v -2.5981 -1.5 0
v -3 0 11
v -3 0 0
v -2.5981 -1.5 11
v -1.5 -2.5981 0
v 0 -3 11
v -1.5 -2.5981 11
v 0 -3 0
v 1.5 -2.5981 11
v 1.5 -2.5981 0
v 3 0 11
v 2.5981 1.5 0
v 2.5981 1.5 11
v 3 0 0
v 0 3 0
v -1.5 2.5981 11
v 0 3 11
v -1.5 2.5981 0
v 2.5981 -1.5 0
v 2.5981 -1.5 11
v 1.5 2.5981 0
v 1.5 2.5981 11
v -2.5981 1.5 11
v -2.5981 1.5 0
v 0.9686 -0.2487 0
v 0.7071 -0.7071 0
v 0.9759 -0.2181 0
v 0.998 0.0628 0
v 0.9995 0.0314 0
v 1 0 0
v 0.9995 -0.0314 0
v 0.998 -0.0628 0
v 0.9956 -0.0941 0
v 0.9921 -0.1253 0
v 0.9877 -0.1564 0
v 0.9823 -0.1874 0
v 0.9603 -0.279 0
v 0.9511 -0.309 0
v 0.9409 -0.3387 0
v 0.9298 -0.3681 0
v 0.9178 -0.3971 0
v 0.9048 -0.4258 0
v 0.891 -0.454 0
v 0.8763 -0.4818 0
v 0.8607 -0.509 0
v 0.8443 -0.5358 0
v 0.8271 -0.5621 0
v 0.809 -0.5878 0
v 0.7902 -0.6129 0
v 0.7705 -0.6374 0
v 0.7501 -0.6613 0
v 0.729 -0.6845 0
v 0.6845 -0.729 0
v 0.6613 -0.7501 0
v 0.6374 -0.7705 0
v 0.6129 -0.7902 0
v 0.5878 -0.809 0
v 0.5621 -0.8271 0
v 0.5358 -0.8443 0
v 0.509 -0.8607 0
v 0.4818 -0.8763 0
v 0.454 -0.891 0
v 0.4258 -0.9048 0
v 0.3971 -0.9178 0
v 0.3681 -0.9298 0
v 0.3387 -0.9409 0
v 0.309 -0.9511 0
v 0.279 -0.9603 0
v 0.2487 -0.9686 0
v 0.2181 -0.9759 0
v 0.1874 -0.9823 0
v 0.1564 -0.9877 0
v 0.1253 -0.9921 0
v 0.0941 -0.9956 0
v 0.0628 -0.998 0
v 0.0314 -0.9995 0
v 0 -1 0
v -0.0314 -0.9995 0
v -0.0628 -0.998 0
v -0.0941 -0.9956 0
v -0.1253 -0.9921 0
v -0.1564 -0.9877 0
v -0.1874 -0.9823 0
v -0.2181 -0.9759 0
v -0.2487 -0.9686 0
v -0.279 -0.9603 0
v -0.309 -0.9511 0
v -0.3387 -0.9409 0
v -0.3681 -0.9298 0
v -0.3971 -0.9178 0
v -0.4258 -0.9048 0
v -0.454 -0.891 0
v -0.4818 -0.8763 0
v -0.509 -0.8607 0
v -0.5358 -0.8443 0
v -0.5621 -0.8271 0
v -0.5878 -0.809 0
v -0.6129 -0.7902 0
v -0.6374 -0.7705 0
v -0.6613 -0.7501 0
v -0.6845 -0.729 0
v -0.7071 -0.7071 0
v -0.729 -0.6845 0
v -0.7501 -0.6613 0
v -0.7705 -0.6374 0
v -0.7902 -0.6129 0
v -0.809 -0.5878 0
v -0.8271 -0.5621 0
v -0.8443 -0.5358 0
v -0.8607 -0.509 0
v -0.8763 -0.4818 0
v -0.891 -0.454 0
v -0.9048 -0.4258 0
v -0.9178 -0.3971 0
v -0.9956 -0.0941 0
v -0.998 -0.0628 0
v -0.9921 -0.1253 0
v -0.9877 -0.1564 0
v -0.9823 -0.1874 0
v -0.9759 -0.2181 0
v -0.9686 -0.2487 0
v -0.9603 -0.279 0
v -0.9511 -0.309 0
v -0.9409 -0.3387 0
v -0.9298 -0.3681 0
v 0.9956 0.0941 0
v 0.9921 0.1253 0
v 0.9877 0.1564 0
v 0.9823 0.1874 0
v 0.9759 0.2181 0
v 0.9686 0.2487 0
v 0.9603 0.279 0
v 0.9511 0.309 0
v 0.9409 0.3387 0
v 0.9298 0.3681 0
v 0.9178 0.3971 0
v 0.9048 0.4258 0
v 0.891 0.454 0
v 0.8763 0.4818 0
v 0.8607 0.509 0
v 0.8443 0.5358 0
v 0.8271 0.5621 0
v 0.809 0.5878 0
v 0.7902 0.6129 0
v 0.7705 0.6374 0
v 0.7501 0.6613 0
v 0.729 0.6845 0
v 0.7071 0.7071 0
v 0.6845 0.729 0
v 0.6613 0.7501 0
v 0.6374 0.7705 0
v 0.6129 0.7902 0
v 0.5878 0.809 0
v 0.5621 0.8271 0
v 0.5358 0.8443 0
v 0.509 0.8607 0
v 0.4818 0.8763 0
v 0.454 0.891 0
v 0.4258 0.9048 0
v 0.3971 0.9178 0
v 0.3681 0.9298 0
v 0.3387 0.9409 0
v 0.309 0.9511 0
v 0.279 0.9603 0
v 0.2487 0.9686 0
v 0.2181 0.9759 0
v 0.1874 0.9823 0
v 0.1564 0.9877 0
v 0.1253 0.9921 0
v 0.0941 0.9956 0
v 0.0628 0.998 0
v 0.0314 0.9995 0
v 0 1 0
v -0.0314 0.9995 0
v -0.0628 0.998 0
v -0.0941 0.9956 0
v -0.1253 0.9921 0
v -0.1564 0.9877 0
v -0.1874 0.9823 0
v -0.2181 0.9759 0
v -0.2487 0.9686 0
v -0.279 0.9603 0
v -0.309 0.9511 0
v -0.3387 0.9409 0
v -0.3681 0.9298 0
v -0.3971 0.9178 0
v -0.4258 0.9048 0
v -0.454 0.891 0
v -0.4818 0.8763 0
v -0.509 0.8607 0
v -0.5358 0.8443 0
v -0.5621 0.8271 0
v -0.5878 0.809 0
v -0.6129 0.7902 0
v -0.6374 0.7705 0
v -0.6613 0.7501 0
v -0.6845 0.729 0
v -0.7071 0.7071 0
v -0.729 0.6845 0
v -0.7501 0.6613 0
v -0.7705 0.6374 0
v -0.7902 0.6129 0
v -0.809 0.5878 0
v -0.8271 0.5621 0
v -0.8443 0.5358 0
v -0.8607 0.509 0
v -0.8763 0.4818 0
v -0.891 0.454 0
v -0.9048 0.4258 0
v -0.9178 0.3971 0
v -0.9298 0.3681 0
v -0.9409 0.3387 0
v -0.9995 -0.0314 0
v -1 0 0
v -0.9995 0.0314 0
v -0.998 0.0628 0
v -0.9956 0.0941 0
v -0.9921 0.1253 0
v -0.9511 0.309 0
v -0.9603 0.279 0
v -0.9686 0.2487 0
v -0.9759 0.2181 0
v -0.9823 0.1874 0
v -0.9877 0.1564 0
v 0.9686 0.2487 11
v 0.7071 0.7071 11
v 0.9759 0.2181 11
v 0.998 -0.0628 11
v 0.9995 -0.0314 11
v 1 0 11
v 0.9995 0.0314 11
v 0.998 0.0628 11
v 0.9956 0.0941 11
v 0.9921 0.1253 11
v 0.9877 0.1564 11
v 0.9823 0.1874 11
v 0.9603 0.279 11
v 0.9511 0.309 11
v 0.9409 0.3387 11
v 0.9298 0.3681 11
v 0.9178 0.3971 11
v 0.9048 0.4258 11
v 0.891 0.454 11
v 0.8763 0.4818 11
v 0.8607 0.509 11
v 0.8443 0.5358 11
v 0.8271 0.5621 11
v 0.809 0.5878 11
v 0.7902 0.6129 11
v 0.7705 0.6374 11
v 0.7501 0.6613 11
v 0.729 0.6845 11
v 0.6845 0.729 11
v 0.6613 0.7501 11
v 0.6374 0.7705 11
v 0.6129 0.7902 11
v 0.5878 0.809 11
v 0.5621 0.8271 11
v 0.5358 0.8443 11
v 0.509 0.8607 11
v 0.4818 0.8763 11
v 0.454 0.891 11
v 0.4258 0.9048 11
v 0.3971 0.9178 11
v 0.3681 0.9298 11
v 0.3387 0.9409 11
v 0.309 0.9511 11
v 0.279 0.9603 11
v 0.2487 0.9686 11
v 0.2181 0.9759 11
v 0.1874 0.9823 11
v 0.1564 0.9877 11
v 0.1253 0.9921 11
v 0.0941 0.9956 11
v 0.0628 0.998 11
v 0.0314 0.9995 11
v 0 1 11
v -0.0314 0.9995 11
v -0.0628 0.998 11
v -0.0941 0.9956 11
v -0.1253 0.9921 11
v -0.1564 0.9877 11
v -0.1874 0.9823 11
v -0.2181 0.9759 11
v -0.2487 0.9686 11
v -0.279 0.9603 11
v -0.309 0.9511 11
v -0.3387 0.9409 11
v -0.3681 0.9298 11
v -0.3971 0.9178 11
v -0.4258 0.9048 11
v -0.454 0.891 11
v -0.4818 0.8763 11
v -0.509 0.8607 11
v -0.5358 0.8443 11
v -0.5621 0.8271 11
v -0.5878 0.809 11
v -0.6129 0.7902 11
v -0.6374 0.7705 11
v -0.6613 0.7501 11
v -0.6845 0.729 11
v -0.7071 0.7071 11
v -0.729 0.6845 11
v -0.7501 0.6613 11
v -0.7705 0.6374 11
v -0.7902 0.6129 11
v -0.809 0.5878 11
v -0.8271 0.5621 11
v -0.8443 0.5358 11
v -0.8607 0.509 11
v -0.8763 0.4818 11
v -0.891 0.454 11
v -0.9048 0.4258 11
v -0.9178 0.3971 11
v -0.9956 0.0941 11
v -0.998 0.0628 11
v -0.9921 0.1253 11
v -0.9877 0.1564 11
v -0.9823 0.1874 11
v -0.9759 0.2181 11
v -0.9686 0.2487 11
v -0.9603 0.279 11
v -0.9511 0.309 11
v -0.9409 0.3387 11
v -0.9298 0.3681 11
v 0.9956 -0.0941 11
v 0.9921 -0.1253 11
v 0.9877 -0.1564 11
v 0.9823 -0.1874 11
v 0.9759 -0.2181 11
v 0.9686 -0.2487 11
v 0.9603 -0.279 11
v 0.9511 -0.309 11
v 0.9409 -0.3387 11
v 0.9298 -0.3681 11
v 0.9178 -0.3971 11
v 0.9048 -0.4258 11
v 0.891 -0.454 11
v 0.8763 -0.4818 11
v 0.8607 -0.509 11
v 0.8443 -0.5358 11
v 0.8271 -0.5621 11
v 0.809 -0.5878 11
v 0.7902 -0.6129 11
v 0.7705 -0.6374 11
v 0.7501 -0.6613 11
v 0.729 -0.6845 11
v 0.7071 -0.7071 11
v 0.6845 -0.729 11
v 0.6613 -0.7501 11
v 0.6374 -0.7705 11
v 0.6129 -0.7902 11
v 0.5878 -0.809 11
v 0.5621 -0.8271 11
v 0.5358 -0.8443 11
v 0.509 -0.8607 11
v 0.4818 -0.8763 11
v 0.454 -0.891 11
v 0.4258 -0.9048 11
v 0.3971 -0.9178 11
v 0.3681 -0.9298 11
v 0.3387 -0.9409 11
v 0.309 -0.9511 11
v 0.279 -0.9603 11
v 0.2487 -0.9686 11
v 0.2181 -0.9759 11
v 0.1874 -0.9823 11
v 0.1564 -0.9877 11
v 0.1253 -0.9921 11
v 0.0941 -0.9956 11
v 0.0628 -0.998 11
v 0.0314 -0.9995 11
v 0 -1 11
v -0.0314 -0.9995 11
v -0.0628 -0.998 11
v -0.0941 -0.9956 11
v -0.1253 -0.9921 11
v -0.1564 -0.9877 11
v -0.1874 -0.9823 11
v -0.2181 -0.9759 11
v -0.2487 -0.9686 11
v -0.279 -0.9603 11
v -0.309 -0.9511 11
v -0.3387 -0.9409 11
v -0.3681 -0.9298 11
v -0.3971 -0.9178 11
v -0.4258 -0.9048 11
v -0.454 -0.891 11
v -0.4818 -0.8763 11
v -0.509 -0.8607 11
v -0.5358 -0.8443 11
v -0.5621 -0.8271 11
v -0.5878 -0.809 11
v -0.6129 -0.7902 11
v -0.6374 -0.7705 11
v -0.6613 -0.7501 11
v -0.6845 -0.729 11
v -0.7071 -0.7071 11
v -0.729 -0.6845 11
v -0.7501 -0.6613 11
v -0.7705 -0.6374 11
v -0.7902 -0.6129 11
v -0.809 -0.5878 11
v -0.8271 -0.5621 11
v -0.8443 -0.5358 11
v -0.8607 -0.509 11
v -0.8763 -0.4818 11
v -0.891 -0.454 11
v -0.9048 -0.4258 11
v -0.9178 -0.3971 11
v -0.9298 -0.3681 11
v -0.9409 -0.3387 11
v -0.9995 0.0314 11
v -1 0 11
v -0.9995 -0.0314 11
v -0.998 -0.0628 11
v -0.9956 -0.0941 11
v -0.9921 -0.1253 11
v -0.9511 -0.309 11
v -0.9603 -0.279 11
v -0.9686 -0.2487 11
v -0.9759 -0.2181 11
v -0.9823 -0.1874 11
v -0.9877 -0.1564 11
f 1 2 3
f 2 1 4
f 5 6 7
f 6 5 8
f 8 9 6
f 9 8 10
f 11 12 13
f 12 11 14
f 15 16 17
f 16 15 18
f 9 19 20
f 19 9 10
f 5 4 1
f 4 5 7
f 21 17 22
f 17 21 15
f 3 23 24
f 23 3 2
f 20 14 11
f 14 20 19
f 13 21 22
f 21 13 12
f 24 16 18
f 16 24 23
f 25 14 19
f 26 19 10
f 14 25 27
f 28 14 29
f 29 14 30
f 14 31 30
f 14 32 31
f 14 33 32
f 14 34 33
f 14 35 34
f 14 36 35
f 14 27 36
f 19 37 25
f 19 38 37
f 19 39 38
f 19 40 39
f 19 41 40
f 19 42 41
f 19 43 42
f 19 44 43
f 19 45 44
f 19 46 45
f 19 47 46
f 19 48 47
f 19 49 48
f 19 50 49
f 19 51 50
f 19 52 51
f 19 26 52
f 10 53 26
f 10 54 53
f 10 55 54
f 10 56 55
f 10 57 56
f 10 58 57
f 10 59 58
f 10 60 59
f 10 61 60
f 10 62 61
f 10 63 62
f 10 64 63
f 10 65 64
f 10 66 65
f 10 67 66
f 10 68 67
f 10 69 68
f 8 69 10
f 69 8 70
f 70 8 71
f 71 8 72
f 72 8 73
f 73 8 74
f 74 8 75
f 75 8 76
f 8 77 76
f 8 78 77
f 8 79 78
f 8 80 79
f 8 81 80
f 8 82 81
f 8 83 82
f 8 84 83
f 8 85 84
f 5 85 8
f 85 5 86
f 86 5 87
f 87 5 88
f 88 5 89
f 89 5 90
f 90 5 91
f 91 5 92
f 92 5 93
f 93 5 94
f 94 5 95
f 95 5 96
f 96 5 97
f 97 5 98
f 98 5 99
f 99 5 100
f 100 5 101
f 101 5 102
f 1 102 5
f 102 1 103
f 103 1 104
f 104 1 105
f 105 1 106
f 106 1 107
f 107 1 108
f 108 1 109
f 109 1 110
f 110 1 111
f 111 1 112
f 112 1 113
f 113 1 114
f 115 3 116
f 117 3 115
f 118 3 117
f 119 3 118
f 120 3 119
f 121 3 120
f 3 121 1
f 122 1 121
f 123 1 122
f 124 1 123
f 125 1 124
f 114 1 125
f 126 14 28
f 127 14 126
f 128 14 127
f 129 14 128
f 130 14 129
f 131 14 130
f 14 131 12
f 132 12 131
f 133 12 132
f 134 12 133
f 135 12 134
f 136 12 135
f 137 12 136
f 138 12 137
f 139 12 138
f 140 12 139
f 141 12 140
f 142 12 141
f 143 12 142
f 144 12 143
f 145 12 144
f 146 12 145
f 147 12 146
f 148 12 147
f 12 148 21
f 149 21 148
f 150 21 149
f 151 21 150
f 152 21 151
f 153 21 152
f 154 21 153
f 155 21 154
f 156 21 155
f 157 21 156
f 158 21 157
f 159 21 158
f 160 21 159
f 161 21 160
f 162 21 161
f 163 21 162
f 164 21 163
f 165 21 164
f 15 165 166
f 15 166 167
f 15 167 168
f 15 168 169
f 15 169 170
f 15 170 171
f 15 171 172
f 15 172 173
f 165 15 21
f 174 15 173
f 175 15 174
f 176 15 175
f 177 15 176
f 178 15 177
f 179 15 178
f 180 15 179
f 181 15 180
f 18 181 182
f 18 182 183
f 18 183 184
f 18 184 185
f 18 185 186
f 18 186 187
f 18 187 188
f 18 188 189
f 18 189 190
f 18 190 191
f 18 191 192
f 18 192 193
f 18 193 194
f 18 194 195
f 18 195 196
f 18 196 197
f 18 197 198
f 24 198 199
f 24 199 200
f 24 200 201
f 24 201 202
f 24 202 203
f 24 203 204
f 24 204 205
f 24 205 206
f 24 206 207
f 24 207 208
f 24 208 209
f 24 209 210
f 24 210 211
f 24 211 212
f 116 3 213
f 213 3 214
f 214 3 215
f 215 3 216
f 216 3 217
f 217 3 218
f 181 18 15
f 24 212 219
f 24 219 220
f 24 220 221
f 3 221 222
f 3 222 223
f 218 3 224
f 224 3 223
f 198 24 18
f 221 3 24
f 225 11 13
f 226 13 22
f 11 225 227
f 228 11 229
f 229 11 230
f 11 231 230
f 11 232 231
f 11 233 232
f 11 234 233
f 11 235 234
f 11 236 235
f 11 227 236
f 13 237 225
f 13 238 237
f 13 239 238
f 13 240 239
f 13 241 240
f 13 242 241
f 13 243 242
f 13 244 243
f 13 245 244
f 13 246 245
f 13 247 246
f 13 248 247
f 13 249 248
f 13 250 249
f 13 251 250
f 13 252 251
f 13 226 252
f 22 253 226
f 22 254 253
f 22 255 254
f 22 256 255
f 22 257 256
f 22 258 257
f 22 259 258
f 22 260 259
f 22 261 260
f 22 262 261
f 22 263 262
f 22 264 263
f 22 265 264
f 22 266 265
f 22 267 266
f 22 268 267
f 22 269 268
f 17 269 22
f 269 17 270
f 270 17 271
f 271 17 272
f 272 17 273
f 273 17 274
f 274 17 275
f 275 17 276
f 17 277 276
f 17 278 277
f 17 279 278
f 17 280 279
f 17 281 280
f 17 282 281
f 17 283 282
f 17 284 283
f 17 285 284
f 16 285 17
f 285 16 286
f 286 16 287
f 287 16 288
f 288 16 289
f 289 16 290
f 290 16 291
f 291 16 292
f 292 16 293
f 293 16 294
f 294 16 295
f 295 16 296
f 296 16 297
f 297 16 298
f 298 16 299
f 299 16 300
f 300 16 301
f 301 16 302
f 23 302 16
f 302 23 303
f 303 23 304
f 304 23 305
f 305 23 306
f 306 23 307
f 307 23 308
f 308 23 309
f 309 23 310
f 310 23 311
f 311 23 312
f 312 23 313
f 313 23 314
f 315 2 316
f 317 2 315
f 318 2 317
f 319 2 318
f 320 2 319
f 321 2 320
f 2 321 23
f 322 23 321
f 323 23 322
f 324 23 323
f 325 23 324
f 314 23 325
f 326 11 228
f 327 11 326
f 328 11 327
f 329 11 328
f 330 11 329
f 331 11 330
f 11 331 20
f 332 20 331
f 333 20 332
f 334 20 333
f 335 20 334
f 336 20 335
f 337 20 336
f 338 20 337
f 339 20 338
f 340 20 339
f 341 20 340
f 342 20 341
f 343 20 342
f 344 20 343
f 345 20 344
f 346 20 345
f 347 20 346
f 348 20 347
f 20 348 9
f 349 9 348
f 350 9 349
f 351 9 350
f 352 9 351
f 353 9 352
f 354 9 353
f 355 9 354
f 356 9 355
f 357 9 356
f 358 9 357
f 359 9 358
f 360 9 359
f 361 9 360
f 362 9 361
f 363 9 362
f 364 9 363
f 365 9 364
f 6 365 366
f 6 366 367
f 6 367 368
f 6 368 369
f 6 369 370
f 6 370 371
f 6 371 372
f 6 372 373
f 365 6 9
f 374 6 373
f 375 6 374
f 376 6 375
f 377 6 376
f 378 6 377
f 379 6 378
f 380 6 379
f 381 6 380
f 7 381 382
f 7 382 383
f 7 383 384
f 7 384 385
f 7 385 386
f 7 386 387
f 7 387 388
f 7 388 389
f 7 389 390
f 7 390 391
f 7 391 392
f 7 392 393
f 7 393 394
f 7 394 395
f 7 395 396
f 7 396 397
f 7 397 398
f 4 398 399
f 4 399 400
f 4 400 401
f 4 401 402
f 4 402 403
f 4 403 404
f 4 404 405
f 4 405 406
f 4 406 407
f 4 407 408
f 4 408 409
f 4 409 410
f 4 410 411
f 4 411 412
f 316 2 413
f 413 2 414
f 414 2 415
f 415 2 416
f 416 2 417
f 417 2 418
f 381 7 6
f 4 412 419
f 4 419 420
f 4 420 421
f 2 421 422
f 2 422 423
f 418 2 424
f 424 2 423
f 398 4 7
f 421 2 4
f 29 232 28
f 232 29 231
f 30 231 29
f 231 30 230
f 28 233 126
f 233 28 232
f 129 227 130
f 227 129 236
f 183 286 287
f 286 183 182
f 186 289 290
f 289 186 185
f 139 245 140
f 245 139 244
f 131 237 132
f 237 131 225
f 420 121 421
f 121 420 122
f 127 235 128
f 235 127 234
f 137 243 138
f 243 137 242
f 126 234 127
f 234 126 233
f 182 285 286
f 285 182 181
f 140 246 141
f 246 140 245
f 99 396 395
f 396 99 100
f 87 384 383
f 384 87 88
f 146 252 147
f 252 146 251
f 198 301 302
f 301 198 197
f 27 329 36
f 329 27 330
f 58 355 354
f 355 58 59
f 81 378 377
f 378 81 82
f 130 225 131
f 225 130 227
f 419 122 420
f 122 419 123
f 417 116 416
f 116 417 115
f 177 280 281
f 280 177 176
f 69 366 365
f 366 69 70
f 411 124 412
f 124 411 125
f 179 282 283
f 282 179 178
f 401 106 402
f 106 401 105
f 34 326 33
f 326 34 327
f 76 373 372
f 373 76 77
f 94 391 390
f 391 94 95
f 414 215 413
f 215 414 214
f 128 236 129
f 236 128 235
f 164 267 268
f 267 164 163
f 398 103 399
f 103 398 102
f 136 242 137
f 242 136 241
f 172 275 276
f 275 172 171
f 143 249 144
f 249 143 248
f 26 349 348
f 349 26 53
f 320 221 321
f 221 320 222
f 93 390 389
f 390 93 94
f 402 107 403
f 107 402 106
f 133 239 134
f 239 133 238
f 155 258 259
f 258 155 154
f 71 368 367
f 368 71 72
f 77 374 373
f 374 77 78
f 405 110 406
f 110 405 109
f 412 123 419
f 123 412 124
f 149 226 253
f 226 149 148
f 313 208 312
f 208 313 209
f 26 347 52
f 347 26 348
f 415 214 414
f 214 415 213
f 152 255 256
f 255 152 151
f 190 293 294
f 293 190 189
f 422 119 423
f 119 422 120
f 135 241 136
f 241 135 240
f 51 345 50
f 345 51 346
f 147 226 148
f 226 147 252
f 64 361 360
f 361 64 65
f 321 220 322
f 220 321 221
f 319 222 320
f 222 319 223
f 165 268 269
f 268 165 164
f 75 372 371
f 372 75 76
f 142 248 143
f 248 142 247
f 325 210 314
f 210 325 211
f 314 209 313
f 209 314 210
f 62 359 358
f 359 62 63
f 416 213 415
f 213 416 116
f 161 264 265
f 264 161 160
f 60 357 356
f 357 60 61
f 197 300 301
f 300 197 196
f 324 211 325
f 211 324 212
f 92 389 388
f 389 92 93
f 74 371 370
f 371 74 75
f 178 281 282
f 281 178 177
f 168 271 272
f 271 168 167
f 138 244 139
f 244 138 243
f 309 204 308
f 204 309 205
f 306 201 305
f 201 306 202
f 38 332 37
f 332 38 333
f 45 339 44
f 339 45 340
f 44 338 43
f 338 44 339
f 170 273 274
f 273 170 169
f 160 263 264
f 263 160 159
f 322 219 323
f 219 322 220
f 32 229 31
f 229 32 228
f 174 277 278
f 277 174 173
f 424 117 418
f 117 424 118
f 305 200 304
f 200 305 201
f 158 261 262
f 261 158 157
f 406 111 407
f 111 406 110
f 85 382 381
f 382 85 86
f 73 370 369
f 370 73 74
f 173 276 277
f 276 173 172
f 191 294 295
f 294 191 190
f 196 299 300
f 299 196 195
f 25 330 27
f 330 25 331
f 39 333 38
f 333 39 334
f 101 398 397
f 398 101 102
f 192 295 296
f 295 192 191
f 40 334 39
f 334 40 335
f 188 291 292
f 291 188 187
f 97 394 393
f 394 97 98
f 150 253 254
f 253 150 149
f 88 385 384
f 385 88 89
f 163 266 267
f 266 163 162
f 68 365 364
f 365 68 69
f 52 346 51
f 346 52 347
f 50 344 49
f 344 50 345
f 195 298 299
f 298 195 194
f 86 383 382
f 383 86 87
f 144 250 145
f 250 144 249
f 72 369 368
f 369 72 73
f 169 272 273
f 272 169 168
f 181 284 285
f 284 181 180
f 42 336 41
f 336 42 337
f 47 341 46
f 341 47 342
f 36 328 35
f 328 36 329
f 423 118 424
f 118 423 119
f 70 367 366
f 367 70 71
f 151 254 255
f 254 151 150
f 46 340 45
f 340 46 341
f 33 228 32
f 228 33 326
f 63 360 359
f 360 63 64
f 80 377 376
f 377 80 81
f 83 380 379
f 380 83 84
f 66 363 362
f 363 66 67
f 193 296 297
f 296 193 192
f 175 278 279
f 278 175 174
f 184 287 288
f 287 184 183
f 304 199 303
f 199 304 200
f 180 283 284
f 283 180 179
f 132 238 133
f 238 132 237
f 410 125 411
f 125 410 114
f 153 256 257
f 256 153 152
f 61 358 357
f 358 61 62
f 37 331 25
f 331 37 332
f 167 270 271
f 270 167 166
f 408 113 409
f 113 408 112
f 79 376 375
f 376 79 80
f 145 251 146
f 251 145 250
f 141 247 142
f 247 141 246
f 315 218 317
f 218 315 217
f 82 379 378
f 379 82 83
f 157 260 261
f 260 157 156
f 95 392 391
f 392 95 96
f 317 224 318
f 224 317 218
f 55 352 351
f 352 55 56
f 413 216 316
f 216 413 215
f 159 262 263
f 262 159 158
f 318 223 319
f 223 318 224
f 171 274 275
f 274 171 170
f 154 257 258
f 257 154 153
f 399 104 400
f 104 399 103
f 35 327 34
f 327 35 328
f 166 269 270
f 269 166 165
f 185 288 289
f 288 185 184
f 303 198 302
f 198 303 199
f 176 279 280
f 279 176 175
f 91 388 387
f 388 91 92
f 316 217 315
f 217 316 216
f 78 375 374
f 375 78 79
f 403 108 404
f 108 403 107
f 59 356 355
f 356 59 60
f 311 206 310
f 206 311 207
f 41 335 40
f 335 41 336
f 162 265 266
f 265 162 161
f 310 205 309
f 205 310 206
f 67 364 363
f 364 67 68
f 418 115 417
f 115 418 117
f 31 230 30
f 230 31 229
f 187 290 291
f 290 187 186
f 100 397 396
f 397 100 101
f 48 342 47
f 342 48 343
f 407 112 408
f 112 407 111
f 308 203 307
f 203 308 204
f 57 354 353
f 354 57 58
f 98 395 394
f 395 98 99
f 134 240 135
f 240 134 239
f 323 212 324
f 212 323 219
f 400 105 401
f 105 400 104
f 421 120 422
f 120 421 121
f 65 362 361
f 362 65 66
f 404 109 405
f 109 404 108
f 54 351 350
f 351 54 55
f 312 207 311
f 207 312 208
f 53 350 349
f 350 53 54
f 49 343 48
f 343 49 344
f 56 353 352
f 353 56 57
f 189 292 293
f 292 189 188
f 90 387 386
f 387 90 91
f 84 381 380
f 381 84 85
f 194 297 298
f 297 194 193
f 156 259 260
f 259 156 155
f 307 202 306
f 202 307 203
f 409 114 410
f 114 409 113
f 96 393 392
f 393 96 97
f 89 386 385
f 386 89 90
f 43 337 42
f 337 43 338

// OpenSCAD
module button_base($fn=200) {
    difference() {
        hull() {
            cylinder(11,3,3, $fn=12);
            cylinder(11, 2.7, 2.7);
        }
        translate([0,0,-0.5])
            cylinder(130, 1, 1);
    }
}



button_base();
